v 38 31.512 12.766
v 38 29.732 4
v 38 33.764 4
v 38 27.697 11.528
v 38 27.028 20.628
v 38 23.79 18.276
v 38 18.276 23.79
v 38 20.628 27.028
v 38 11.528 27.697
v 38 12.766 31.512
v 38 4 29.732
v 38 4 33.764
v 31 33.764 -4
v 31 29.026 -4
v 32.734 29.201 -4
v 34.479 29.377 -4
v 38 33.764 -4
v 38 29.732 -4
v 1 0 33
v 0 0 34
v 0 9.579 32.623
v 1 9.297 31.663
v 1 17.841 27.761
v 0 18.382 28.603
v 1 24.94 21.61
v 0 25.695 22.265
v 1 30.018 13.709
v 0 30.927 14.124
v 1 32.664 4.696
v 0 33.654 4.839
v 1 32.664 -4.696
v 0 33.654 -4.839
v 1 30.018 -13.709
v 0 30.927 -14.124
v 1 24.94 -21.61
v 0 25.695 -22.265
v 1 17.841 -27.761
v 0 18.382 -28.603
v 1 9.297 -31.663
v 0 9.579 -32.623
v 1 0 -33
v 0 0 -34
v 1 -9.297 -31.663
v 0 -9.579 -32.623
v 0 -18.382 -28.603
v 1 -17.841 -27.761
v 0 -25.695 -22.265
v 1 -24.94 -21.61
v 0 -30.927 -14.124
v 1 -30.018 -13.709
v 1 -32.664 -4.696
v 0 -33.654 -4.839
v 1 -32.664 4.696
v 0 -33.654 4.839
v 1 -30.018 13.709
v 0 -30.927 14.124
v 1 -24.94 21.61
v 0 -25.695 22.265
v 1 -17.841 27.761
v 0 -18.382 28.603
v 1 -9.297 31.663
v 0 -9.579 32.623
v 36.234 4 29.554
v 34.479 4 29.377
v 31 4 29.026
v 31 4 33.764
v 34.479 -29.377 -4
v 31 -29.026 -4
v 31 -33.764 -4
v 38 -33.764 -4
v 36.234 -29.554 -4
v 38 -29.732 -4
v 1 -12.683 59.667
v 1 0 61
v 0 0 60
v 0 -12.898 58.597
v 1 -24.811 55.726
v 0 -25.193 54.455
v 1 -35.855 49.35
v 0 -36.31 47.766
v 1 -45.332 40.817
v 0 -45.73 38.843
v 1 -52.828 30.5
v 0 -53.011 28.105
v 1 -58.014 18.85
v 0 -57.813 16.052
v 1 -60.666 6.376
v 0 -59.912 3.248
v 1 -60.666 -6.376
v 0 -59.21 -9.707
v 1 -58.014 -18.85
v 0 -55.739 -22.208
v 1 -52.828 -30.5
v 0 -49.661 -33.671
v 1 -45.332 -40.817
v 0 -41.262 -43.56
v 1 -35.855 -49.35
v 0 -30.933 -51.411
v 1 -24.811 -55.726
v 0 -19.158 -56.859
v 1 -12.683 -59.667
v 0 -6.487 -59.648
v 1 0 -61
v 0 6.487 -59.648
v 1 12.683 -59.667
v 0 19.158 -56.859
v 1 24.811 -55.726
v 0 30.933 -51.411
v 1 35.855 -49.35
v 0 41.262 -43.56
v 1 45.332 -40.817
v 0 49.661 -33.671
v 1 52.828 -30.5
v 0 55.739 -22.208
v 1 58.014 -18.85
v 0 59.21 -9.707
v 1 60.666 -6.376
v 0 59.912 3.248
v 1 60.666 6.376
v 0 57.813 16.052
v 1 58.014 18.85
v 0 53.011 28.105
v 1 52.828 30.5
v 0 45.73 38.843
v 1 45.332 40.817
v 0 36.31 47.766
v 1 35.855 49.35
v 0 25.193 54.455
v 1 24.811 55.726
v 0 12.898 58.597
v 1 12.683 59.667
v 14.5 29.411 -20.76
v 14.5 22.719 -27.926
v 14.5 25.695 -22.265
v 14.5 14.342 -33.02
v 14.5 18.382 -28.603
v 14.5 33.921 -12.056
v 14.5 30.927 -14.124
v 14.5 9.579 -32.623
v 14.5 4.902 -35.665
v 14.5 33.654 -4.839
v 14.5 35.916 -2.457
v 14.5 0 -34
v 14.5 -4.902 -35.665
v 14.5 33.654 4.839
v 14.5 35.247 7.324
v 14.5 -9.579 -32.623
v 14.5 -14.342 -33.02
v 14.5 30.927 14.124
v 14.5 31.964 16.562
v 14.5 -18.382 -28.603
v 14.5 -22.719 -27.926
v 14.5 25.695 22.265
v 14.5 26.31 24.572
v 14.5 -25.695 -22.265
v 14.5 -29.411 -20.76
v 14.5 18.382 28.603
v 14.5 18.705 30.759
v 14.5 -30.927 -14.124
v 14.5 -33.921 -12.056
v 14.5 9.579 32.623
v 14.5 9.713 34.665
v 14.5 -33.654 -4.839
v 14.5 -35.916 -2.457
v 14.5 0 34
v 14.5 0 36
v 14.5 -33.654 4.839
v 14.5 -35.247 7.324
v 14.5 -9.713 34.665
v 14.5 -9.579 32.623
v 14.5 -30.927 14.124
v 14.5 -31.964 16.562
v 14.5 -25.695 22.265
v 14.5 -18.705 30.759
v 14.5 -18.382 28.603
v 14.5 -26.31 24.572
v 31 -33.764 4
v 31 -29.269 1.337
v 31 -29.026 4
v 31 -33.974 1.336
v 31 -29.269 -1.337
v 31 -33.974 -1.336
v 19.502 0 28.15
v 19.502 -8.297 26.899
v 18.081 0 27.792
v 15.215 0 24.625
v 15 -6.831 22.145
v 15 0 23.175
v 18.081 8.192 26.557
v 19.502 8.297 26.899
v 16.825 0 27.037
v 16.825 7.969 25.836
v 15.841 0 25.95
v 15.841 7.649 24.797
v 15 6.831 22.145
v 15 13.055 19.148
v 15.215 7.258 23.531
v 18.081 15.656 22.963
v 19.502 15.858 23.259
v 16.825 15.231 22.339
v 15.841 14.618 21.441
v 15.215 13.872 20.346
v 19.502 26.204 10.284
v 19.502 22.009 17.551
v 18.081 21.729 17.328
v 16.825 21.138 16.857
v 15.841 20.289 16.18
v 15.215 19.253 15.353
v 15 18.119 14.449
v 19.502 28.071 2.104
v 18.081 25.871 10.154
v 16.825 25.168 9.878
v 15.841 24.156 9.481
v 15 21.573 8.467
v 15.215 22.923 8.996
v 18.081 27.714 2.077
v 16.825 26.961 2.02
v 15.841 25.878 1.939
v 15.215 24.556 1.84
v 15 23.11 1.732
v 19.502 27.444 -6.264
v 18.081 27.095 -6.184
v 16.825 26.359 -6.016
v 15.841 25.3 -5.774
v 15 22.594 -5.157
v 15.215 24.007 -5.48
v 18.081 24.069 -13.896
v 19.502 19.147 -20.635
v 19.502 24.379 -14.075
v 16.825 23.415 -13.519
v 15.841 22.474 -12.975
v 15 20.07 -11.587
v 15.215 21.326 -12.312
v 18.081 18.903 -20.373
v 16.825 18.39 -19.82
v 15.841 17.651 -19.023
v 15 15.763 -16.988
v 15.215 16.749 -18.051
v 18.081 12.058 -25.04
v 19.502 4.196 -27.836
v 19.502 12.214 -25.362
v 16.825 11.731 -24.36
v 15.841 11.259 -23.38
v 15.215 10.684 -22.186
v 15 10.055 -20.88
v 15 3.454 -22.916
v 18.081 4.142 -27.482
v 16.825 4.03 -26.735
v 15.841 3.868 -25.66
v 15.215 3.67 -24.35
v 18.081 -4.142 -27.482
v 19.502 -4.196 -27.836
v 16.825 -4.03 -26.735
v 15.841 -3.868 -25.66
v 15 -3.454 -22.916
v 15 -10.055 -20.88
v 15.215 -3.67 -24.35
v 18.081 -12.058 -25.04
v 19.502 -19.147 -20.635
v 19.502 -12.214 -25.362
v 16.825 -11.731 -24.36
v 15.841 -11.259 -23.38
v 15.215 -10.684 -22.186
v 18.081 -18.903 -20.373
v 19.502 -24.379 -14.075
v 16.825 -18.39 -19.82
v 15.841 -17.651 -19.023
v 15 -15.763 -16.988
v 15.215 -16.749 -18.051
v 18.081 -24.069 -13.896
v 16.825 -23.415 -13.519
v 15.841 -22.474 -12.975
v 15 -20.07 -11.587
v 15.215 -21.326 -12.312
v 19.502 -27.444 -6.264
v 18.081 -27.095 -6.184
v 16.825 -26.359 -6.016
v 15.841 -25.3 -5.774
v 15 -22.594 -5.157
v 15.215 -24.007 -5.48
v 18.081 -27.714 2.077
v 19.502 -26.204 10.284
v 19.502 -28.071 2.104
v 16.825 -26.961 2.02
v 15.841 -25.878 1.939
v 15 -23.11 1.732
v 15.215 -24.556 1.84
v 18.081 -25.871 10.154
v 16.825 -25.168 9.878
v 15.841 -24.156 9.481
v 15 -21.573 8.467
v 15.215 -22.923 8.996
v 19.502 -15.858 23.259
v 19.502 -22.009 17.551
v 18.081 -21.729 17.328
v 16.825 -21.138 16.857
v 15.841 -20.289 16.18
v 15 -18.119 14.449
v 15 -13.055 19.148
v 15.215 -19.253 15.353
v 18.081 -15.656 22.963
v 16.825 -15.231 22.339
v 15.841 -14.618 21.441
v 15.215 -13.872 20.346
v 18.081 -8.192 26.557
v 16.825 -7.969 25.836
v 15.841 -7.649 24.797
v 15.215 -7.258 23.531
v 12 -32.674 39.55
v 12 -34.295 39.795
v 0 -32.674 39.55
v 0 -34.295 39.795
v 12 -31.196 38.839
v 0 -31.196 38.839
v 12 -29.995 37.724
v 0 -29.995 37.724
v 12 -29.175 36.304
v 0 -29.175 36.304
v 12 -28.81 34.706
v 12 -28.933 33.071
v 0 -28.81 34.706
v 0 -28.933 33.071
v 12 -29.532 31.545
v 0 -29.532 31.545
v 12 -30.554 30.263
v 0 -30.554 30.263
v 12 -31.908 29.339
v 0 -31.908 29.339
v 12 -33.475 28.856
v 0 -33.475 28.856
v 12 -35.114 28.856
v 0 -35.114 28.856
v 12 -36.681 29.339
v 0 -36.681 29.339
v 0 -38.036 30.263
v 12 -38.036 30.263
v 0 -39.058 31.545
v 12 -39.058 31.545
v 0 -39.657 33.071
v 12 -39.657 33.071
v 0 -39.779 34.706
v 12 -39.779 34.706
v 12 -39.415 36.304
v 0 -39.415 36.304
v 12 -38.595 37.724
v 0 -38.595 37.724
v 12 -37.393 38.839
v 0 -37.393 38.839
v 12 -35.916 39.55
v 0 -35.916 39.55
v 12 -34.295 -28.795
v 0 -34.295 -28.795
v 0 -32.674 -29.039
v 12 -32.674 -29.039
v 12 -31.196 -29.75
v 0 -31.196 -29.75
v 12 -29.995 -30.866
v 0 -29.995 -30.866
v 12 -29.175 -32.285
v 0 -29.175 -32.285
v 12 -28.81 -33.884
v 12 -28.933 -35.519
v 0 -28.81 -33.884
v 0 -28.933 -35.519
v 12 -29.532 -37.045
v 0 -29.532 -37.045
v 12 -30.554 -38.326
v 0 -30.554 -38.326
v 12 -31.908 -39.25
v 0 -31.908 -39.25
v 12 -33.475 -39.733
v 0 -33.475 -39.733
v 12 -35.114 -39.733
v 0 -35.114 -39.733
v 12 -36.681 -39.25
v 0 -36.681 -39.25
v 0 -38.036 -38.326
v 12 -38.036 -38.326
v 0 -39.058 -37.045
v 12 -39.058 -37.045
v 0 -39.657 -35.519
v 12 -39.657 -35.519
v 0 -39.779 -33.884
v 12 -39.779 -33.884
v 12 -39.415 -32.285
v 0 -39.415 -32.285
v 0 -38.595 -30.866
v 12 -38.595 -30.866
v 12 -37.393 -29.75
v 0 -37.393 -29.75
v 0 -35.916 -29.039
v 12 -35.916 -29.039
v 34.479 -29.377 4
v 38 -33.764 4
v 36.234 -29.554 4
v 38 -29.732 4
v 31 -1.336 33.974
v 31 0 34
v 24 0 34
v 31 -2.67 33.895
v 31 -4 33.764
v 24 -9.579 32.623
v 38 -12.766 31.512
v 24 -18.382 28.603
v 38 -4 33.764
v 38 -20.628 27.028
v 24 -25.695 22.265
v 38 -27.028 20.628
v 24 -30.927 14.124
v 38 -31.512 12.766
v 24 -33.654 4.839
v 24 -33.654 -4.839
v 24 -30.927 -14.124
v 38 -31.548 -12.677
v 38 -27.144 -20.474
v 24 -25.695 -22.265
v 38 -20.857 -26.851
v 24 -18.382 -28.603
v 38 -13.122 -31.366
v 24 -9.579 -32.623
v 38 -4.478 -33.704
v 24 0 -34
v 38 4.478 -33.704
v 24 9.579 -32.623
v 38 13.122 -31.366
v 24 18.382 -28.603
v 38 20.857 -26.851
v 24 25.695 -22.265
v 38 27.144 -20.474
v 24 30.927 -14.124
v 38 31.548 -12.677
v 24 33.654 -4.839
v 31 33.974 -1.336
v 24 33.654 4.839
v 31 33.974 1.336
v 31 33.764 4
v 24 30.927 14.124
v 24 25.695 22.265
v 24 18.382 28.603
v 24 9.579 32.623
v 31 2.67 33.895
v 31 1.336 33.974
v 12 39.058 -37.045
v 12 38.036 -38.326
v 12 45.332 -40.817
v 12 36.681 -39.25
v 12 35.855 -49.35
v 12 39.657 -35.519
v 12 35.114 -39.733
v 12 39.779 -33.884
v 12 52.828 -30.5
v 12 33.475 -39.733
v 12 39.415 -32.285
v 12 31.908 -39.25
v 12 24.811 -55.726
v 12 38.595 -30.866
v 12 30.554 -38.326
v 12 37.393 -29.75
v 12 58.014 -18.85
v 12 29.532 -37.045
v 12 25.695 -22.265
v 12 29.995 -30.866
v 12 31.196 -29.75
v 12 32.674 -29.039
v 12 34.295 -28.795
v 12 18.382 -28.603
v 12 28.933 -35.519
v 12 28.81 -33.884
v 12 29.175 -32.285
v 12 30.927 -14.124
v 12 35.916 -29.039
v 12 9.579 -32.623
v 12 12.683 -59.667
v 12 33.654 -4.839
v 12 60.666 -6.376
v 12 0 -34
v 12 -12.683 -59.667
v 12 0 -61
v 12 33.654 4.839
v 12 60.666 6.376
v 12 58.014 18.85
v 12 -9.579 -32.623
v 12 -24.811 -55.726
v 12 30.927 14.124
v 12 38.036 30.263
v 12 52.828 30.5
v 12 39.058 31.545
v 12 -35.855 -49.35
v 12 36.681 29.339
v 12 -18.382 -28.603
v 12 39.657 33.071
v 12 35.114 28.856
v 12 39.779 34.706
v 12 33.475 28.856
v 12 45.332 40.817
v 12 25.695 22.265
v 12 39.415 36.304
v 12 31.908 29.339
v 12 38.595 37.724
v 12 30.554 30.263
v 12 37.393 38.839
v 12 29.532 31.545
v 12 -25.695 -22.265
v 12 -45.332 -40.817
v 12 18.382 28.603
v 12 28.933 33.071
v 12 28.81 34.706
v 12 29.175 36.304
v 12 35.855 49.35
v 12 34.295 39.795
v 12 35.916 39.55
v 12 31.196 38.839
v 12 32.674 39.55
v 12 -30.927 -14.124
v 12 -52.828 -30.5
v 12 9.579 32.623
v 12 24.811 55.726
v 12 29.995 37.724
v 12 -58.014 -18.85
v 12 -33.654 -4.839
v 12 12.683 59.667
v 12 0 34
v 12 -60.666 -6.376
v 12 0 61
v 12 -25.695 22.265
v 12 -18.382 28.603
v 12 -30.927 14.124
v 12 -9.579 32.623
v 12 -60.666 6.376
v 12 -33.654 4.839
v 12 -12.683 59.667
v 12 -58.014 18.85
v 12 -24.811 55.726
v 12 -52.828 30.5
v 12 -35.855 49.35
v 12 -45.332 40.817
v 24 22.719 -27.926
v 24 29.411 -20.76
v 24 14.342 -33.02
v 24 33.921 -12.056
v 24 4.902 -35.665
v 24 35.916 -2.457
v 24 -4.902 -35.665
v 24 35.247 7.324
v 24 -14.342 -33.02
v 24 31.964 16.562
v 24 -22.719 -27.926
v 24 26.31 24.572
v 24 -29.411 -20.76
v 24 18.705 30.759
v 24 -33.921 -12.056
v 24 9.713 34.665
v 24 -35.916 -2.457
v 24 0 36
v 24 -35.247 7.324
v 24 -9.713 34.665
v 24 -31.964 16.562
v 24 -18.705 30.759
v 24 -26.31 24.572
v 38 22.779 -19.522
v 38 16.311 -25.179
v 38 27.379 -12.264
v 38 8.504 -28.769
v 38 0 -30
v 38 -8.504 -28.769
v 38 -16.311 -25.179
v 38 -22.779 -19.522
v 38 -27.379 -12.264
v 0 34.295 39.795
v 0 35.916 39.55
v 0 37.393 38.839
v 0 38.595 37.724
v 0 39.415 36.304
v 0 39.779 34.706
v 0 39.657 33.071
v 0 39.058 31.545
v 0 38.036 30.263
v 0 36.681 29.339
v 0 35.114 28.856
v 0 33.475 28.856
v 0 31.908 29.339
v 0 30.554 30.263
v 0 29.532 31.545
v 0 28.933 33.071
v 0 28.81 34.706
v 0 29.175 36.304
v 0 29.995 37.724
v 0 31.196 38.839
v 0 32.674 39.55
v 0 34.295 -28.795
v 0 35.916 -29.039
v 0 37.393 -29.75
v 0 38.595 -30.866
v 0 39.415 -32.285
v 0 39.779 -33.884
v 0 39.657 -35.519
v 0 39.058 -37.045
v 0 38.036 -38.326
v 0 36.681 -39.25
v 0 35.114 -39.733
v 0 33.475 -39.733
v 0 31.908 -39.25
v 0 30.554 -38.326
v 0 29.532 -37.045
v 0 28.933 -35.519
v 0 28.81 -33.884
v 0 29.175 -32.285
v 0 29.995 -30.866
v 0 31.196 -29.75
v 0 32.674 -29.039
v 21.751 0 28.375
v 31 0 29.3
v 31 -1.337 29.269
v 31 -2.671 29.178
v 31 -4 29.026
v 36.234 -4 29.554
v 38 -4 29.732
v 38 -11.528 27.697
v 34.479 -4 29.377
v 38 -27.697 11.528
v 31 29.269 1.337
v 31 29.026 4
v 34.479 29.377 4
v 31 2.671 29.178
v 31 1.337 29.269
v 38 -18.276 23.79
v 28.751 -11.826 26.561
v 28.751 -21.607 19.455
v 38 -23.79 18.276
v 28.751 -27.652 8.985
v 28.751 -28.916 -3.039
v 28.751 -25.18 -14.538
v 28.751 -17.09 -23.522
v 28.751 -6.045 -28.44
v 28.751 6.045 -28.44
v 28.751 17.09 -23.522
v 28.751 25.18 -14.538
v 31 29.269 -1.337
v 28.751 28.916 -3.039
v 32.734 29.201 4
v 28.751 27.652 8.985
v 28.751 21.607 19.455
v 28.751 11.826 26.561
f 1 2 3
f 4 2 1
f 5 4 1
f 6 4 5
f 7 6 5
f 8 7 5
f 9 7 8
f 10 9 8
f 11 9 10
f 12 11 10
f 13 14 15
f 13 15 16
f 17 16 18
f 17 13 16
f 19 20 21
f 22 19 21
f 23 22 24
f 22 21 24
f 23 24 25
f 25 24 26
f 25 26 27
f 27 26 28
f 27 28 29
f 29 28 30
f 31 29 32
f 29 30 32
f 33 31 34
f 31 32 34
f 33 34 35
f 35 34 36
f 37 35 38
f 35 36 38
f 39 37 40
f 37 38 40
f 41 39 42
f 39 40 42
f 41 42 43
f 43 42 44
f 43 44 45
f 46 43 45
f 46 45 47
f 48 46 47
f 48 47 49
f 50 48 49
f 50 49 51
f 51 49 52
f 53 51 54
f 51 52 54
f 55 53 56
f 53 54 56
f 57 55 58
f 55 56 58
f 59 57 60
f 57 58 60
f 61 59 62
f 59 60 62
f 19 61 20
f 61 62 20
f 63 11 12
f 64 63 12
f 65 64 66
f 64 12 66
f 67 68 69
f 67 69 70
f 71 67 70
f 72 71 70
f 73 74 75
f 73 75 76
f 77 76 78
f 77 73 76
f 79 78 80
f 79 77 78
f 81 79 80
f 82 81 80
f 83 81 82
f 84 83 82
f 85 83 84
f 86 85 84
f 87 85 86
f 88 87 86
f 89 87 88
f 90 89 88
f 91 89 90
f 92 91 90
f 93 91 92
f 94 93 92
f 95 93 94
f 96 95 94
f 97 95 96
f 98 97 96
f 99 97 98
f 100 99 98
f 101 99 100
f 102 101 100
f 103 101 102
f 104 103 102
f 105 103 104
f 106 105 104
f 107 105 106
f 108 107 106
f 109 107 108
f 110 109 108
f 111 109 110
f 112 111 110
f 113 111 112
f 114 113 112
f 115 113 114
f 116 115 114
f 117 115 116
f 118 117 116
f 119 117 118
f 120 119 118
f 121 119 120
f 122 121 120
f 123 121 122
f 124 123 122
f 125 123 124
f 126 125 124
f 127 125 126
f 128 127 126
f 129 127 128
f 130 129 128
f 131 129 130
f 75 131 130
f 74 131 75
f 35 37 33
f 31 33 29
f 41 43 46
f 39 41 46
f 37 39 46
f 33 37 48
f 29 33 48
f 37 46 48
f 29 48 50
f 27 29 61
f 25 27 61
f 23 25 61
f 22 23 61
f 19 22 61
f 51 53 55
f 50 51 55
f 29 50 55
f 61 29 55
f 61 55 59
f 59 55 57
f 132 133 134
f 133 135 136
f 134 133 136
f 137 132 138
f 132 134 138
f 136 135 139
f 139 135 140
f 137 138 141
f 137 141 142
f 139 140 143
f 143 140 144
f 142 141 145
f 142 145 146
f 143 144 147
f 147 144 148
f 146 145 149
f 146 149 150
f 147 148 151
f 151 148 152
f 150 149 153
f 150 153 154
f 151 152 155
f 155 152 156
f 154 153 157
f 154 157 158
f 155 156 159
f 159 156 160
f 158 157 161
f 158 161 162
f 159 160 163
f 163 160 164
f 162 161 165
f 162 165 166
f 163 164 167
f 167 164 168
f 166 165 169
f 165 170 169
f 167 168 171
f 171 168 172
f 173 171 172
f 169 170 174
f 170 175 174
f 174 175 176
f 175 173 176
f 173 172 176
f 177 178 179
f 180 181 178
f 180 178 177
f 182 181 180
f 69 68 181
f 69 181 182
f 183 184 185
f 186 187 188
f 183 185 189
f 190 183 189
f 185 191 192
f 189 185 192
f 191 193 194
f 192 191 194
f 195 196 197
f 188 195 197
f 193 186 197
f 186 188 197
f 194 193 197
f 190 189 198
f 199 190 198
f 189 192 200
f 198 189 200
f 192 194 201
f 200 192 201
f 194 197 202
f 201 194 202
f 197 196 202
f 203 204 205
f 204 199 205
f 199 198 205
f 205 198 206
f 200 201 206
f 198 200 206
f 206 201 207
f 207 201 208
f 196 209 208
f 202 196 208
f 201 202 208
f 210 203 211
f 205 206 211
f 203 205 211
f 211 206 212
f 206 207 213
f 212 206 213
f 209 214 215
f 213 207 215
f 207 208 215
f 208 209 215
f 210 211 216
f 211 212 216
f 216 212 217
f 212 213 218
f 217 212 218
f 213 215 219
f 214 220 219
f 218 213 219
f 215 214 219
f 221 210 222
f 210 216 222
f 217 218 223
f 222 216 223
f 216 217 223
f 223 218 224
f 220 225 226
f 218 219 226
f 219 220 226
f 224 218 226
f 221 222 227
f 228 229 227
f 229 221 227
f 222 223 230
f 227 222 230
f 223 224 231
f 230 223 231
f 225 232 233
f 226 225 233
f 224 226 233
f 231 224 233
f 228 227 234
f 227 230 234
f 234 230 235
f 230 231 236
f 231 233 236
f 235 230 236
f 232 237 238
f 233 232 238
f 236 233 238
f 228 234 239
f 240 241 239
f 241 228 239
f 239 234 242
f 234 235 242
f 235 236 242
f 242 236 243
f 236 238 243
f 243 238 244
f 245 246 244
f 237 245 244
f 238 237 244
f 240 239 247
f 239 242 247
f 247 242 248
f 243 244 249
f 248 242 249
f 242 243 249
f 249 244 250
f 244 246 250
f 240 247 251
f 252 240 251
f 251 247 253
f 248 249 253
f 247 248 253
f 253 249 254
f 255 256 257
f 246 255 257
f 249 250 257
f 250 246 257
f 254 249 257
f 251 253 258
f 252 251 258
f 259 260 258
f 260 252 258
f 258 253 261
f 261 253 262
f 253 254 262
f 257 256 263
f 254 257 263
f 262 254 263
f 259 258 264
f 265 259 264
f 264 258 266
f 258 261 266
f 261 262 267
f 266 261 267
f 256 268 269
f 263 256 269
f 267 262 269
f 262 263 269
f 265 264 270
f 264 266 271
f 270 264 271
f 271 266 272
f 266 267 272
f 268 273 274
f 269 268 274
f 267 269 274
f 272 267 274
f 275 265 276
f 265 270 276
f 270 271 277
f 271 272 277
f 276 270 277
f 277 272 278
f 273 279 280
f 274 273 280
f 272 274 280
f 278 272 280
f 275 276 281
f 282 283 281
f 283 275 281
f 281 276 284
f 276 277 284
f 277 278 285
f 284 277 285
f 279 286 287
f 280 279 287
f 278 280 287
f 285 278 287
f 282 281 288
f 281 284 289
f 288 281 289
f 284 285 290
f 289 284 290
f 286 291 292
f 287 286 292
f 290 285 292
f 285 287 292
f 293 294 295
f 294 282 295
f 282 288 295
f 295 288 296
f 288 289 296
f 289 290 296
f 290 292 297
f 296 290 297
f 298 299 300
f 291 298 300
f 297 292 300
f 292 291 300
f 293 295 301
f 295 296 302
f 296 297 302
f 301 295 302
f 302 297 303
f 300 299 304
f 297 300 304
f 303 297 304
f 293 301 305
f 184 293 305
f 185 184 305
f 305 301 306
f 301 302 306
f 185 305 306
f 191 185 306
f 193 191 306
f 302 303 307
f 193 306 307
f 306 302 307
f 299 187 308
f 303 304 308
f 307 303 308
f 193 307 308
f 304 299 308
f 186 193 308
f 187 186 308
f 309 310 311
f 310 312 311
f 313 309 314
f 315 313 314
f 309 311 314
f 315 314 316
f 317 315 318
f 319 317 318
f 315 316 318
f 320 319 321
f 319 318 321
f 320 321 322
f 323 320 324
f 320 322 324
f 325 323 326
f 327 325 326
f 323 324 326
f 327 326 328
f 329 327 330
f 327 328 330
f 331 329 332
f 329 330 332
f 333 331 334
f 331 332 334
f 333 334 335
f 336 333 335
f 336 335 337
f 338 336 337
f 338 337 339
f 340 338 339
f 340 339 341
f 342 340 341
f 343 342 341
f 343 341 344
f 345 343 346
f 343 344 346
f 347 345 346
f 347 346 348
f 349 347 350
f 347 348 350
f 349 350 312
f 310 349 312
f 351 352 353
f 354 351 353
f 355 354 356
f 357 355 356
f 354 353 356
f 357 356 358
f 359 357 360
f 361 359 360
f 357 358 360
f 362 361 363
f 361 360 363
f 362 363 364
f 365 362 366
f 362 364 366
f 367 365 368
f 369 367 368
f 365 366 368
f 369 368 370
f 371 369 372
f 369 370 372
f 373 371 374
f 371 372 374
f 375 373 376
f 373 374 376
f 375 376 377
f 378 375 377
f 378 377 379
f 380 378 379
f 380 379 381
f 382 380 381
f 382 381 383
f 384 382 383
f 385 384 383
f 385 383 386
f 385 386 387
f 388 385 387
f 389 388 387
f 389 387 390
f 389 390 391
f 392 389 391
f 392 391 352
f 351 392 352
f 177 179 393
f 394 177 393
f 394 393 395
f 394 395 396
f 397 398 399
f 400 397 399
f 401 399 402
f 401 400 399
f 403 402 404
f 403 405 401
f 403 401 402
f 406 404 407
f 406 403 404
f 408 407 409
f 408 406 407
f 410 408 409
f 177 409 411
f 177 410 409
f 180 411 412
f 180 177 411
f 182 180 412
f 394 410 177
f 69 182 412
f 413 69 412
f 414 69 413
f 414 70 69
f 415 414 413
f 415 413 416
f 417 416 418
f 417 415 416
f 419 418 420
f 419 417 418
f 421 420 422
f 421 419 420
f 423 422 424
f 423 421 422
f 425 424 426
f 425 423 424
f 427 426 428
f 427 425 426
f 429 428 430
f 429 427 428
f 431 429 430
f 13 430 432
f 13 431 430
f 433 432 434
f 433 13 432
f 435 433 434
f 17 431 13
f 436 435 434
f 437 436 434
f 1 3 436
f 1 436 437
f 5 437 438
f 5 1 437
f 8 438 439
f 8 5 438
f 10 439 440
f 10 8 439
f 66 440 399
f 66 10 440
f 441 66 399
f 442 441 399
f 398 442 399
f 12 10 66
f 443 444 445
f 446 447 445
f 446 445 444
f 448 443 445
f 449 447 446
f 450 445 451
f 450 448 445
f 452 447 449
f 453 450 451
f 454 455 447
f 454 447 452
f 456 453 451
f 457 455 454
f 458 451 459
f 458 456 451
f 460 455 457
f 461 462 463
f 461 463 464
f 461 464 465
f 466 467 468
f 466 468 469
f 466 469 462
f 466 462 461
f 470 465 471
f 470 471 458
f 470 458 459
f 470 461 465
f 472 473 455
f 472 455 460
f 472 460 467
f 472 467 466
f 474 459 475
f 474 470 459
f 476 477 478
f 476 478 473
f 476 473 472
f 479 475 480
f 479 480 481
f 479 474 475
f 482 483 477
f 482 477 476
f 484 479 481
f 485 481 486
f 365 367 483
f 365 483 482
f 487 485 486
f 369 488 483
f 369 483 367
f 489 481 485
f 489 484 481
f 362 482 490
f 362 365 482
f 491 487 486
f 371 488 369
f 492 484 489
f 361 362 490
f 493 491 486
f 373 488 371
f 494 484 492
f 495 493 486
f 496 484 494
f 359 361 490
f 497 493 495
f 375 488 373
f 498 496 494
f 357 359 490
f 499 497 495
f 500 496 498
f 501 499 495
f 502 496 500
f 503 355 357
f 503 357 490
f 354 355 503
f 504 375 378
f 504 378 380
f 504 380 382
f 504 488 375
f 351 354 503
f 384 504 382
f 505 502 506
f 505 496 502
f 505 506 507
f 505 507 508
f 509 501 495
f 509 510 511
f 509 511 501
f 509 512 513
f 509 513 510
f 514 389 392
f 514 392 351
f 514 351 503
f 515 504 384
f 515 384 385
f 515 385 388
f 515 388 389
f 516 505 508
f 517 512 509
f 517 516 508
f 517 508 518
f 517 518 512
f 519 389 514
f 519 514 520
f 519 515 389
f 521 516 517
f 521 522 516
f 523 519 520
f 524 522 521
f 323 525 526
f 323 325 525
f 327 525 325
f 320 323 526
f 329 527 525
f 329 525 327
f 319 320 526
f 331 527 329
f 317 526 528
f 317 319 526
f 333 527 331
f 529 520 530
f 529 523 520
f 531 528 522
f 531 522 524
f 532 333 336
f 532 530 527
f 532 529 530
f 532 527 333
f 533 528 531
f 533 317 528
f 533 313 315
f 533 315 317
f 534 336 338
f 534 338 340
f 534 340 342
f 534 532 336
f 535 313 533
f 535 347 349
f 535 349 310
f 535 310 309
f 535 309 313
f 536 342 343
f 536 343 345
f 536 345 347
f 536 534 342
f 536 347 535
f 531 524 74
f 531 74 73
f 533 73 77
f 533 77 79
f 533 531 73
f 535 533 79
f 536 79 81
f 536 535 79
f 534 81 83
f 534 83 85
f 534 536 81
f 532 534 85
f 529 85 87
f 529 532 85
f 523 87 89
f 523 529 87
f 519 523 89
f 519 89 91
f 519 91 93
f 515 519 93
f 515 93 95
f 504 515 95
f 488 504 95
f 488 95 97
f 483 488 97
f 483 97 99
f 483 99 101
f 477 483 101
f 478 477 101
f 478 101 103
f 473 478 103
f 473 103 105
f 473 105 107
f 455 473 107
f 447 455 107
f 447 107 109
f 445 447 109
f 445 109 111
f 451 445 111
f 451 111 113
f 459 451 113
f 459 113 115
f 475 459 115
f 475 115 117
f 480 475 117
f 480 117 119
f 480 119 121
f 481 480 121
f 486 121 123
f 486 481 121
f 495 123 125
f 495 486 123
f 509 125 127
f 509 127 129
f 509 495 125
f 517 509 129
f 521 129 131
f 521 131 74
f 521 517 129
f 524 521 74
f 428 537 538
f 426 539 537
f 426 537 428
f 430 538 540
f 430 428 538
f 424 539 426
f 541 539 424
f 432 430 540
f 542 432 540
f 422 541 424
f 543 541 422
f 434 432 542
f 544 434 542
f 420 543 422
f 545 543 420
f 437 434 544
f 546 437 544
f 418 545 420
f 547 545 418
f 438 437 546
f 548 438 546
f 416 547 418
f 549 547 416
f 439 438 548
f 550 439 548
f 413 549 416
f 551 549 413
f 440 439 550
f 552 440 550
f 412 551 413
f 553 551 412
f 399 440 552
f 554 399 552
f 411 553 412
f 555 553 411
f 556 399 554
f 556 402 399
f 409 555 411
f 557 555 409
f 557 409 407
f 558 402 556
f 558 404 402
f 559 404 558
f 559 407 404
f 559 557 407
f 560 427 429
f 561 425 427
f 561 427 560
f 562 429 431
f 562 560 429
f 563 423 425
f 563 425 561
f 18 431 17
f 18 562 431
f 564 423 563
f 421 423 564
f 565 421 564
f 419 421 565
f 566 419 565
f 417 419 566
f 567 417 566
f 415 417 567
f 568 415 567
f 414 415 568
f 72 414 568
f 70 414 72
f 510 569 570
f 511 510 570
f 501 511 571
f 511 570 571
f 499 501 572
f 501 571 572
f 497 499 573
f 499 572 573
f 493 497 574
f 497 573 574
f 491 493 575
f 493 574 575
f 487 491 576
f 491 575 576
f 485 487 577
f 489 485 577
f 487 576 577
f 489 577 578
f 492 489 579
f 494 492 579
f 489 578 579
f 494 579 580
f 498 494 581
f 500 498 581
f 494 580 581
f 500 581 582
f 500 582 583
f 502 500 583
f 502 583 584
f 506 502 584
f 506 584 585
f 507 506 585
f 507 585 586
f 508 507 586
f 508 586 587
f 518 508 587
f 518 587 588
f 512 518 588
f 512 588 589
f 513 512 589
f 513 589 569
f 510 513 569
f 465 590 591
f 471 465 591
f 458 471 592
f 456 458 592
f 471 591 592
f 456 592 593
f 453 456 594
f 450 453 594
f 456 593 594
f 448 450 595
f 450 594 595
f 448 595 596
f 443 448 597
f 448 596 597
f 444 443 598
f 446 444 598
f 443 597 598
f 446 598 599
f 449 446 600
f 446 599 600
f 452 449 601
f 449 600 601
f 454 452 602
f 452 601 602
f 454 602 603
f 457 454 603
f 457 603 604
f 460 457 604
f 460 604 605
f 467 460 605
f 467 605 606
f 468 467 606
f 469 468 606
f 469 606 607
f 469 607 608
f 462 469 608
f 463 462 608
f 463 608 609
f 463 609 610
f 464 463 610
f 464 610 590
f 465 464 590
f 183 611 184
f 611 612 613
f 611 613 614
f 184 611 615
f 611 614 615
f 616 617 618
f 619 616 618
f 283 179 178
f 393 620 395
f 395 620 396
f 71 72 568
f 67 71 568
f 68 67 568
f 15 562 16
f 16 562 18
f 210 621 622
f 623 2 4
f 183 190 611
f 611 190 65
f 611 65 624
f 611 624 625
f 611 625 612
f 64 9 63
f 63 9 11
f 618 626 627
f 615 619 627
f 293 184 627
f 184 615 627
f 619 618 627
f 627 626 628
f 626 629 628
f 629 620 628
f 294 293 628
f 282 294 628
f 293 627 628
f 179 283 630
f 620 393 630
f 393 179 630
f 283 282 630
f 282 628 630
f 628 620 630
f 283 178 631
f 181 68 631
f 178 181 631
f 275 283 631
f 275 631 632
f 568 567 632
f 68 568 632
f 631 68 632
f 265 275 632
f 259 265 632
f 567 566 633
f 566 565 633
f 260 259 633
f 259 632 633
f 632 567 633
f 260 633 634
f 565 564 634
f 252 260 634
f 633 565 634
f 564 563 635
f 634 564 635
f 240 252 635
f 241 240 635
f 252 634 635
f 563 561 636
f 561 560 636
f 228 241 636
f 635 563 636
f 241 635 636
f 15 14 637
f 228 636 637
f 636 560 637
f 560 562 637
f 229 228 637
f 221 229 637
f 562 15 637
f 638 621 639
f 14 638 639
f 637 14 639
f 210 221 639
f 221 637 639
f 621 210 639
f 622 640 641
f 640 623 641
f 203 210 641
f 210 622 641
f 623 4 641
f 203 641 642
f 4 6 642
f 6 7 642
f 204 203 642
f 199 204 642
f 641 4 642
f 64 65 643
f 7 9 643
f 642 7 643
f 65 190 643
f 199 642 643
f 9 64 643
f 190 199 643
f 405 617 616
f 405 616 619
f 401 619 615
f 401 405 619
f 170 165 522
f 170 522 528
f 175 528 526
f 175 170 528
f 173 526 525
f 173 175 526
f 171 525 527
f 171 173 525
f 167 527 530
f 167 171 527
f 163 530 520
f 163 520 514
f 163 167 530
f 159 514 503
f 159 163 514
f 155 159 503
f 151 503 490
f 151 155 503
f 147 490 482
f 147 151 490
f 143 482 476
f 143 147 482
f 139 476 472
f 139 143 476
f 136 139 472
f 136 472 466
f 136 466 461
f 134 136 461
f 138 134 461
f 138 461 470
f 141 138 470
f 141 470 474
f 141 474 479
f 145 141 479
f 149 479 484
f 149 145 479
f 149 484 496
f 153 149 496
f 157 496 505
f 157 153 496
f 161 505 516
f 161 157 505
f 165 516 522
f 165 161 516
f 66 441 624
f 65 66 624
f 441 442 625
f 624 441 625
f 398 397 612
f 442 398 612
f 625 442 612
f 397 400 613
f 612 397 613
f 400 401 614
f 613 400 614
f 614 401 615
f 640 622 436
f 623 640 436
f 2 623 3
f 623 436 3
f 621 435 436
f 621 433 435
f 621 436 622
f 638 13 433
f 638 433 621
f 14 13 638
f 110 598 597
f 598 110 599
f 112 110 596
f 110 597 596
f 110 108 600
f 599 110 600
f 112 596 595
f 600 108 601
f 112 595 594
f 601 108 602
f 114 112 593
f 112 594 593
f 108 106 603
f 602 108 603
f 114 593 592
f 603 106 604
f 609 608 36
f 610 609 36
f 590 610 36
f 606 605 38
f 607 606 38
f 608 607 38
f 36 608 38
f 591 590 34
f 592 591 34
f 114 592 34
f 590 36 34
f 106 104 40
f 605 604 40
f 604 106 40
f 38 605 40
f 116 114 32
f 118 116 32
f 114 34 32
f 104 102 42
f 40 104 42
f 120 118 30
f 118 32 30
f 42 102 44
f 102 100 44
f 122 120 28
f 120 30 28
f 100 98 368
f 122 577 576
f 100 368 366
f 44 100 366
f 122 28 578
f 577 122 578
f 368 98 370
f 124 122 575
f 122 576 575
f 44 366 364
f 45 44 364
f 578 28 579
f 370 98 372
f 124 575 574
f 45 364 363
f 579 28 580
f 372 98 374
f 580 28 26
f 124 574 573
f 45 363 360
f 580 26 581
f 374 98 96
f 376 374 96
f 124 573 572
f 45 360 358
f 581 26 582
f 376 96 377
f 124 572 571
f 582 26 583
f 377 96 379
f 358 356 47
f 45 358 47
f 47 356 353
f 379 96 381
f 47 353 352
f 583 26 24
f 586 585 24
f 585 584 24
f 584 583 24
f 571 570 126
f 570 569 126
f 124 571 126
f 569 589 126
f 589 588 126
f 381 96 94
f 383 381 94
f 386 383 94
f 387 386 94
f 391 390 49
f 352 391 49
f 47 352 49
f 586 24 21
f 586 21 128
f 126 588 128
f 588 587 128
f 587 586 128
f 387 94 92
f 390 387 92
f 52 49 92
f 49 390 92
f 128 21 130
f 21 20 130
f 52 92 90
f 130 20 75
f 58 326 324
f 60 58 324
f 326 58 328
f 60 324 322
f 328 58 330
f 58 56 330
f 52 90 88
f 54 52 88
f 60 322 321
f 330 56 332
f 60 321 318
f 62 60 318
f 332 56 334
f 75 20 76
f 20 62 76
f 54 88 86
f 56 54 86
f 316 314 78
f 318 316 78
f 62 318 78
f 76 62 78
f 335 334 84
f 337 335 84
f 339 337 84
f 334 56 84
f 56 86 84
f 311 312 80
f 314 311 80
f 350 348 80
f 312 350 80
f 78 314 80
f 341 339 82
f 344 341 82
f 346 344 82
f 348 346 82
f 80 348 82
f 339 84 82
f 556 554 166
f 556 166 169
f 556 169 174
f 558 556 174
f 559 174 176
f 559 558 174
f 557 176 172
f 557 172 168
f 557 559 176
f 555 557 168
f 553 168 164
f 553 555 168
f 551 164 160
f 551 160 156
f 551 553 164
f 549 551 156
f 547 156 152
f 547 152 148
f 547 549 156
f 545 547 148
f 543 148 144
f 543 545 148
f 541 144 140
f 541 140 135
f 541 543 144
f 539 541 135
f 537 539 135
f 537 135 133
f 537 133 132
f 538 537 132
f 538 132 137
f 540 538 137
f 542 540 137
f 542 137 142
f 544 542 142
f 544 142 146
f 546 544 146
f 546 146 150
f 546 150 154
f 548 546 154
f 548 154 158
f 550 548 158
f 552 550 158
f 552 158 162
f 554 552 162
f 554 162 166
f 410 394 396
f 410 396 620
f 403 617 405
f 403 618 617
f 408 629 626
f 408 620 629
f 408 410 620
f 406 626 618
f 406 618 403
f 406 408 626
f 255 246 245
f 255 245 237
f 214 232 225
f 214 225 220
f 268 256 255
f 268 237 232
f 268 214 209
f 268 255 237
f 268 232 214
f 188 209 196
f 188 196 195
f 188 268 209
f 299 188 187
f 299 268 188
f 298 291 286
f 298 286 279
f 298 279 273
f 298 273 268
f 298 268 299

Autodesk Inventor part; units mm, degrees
ref_plane "YZ Plane" through (0, 0, 0) normal (1, 0, 0) x (0, 1, 0)
ref_plane "XZ Plane" through (0, 0, 0) normal (0, 1, 0) x (-1, 0, 0)
ref_plane "XY Plane" through (0, 0, 0) normal (0, 0, 1) x (1, 0, 0)
sketch "草图1" plane through (0, 0, 0) normal (0, 1, 0) x (-1, 0, 0)
  line L0 (0, 61) -> (-12, 61)
  line L1 (-12, 61) -> (-12, 34)
  line L2 (-12, 34) -> (-14.5, 34)
  line L3 (-14.5, 34) -> (-14.5, 36)
  line L4 (-14.5, 36) -> (-24, 36)
  line L5 (-24, 36) -> (-24, 34)
  line L6 (-24, 34) -> (-38, 34)
  line L7 (-38, 34) -> (-38, 0)
  line L8 (-38, 0) -> (0, 0)
  line L9 (0, 0) -> (0, 61)
  line L10 (0, 34) -> (-1, 33)
  line L11 (-1, 33) -> (-1, 0)
  line L12 (-38, 30) -> (-15, 27.6998)
  line L13 (-15, 27.6998) -> (-15, 0)
  line L14 (7.6, 0) -> (-45.6, 0) projected
  dimension "d2" = 61
  dimension "d4" = 26
  dimension "d5" = 12
  dimension "d6" = 36
  dimension "d7" = 34
  dimension "d8" = 12
  dimension "d9" = 2.5
  dimension "d10" = 34
  dimension "d11" = 45
  dimension "d12" = 1
  dimension "d13" = 15
  dimension "d14" = 30
  dimension "d15" = 84.289
revolve "旋转1" add sketch "草图1" angle 360 about axis through (-10, 0, 0) along (1, 0, 0) contours L9 L10 L11 L8 L13 L12 L7 L6 L5 L4 L3 L2 L1 L0
sketch "草图2" plane through (0, 0, 0) normal (0, 1, 0) x (-1, 0, 0)
  line L0 (-24, 34) -> (-38, 34) projected
  line L1 (-38, 34) -> (-31, 34)
  line L2 (-31, 34) -> (-31, -24)
  line L3 (-31, -24) -> (-38, -24)
  line L4 (-38, -24) -> (-38, 34)
  point P0 (0, 0)
  dimension "d17" = 7
extrude "拉伸1" cut sketch "草图2" along normal mid plane 8
sketch "草图3" plane through (0, 0, 0) normal (0, 0, 1) x (1, 0, 0)
  line L0 (38, 4) -> (38, 34) projected
  line L1 (24, -34) -> (38, -34) projected
  line L2 (38, 34) -> (31, 34)
  line L3 (31, 34) -> (31, -34)
  line L4 (31, -34) -> (38, -34)
  line L5 (38, -34) -> (38, 34)
  point P0 (0, 0)
  point P1 (38, -4)
  dimension "d20" = 7
extrude "拉伸2" cut sketch "草图3" along normal mid plane 8
sketch "草图4" plane through (0, 0, 0) normal (-1, 0, 0) x (0, 0, 1)
  circle A0 centre (34.2947, 34.2947) radius 5.5
  circle A1 centre (-34.2947, 34.2947) radius 5.5
  circle A2 centre (-34.2947, -34.2947) radius 5.5
  circle A3 centre (34.2947, -34.2947) radius 5.5
  line L0 (34.2947, 34.2947) -> (0, 0)
  line L1 (0, -85.4) -> (0, 85.4) projected
  dimension "d23" = 11
  dimension "d24" = 48.5
  dimension "d27" = 360
  dimension "d35" = 45
extrude "拉伸3" cut sketch "草图4" against normal up to surface (12 mm away)
chamfer "倒角1" distance 1 angle 45 1 edges at (0, 0, -61)
fillet "圆角1" radius 5 1 edges at (15, 0, -27.6998)
equation "\"d2\" = 0.5 * D2"
equation "\"d4\" = M"
equation "\"d5\" = e"
equation "\"d6\" = 0.5 * D"
equation "\"d7\" = 0.5 * D_d"
equation "\"d8\" = e1"
equation "\"d10\" = 0.5 * D_d"
equation "\"d13\" = b1"
equation "\"d14\" = 0.5 * D4"
equation "\"d17\" = h_b"
equation "\"d18\" = b"
equation "\"d20\" = h_b"
equation "\"d21\" = b"
equation "\"d23\" = d0"
equation "\"d24\" = 0.5 * D0"
equation "\"d29\" = b"
equation "\"d0\" = 11"
equation "\"D\" = 72"
equation "\"D0\" = 97"
equation "\"D2\" = 122"
equation "\"D_d\" = 68"
equation "\"e\" = 12"
equation "\"e1\" = 12"
equation "\"b\" = 8"
equation "\"h_b\" = 7"
equation "\"M\" = 26"
equation "\"b1\" = 15"
equation "\"d1\" = 26"
equation "\"D4\" = 60"
properties part number "中间轴承闷盖" material "灰口铁"
